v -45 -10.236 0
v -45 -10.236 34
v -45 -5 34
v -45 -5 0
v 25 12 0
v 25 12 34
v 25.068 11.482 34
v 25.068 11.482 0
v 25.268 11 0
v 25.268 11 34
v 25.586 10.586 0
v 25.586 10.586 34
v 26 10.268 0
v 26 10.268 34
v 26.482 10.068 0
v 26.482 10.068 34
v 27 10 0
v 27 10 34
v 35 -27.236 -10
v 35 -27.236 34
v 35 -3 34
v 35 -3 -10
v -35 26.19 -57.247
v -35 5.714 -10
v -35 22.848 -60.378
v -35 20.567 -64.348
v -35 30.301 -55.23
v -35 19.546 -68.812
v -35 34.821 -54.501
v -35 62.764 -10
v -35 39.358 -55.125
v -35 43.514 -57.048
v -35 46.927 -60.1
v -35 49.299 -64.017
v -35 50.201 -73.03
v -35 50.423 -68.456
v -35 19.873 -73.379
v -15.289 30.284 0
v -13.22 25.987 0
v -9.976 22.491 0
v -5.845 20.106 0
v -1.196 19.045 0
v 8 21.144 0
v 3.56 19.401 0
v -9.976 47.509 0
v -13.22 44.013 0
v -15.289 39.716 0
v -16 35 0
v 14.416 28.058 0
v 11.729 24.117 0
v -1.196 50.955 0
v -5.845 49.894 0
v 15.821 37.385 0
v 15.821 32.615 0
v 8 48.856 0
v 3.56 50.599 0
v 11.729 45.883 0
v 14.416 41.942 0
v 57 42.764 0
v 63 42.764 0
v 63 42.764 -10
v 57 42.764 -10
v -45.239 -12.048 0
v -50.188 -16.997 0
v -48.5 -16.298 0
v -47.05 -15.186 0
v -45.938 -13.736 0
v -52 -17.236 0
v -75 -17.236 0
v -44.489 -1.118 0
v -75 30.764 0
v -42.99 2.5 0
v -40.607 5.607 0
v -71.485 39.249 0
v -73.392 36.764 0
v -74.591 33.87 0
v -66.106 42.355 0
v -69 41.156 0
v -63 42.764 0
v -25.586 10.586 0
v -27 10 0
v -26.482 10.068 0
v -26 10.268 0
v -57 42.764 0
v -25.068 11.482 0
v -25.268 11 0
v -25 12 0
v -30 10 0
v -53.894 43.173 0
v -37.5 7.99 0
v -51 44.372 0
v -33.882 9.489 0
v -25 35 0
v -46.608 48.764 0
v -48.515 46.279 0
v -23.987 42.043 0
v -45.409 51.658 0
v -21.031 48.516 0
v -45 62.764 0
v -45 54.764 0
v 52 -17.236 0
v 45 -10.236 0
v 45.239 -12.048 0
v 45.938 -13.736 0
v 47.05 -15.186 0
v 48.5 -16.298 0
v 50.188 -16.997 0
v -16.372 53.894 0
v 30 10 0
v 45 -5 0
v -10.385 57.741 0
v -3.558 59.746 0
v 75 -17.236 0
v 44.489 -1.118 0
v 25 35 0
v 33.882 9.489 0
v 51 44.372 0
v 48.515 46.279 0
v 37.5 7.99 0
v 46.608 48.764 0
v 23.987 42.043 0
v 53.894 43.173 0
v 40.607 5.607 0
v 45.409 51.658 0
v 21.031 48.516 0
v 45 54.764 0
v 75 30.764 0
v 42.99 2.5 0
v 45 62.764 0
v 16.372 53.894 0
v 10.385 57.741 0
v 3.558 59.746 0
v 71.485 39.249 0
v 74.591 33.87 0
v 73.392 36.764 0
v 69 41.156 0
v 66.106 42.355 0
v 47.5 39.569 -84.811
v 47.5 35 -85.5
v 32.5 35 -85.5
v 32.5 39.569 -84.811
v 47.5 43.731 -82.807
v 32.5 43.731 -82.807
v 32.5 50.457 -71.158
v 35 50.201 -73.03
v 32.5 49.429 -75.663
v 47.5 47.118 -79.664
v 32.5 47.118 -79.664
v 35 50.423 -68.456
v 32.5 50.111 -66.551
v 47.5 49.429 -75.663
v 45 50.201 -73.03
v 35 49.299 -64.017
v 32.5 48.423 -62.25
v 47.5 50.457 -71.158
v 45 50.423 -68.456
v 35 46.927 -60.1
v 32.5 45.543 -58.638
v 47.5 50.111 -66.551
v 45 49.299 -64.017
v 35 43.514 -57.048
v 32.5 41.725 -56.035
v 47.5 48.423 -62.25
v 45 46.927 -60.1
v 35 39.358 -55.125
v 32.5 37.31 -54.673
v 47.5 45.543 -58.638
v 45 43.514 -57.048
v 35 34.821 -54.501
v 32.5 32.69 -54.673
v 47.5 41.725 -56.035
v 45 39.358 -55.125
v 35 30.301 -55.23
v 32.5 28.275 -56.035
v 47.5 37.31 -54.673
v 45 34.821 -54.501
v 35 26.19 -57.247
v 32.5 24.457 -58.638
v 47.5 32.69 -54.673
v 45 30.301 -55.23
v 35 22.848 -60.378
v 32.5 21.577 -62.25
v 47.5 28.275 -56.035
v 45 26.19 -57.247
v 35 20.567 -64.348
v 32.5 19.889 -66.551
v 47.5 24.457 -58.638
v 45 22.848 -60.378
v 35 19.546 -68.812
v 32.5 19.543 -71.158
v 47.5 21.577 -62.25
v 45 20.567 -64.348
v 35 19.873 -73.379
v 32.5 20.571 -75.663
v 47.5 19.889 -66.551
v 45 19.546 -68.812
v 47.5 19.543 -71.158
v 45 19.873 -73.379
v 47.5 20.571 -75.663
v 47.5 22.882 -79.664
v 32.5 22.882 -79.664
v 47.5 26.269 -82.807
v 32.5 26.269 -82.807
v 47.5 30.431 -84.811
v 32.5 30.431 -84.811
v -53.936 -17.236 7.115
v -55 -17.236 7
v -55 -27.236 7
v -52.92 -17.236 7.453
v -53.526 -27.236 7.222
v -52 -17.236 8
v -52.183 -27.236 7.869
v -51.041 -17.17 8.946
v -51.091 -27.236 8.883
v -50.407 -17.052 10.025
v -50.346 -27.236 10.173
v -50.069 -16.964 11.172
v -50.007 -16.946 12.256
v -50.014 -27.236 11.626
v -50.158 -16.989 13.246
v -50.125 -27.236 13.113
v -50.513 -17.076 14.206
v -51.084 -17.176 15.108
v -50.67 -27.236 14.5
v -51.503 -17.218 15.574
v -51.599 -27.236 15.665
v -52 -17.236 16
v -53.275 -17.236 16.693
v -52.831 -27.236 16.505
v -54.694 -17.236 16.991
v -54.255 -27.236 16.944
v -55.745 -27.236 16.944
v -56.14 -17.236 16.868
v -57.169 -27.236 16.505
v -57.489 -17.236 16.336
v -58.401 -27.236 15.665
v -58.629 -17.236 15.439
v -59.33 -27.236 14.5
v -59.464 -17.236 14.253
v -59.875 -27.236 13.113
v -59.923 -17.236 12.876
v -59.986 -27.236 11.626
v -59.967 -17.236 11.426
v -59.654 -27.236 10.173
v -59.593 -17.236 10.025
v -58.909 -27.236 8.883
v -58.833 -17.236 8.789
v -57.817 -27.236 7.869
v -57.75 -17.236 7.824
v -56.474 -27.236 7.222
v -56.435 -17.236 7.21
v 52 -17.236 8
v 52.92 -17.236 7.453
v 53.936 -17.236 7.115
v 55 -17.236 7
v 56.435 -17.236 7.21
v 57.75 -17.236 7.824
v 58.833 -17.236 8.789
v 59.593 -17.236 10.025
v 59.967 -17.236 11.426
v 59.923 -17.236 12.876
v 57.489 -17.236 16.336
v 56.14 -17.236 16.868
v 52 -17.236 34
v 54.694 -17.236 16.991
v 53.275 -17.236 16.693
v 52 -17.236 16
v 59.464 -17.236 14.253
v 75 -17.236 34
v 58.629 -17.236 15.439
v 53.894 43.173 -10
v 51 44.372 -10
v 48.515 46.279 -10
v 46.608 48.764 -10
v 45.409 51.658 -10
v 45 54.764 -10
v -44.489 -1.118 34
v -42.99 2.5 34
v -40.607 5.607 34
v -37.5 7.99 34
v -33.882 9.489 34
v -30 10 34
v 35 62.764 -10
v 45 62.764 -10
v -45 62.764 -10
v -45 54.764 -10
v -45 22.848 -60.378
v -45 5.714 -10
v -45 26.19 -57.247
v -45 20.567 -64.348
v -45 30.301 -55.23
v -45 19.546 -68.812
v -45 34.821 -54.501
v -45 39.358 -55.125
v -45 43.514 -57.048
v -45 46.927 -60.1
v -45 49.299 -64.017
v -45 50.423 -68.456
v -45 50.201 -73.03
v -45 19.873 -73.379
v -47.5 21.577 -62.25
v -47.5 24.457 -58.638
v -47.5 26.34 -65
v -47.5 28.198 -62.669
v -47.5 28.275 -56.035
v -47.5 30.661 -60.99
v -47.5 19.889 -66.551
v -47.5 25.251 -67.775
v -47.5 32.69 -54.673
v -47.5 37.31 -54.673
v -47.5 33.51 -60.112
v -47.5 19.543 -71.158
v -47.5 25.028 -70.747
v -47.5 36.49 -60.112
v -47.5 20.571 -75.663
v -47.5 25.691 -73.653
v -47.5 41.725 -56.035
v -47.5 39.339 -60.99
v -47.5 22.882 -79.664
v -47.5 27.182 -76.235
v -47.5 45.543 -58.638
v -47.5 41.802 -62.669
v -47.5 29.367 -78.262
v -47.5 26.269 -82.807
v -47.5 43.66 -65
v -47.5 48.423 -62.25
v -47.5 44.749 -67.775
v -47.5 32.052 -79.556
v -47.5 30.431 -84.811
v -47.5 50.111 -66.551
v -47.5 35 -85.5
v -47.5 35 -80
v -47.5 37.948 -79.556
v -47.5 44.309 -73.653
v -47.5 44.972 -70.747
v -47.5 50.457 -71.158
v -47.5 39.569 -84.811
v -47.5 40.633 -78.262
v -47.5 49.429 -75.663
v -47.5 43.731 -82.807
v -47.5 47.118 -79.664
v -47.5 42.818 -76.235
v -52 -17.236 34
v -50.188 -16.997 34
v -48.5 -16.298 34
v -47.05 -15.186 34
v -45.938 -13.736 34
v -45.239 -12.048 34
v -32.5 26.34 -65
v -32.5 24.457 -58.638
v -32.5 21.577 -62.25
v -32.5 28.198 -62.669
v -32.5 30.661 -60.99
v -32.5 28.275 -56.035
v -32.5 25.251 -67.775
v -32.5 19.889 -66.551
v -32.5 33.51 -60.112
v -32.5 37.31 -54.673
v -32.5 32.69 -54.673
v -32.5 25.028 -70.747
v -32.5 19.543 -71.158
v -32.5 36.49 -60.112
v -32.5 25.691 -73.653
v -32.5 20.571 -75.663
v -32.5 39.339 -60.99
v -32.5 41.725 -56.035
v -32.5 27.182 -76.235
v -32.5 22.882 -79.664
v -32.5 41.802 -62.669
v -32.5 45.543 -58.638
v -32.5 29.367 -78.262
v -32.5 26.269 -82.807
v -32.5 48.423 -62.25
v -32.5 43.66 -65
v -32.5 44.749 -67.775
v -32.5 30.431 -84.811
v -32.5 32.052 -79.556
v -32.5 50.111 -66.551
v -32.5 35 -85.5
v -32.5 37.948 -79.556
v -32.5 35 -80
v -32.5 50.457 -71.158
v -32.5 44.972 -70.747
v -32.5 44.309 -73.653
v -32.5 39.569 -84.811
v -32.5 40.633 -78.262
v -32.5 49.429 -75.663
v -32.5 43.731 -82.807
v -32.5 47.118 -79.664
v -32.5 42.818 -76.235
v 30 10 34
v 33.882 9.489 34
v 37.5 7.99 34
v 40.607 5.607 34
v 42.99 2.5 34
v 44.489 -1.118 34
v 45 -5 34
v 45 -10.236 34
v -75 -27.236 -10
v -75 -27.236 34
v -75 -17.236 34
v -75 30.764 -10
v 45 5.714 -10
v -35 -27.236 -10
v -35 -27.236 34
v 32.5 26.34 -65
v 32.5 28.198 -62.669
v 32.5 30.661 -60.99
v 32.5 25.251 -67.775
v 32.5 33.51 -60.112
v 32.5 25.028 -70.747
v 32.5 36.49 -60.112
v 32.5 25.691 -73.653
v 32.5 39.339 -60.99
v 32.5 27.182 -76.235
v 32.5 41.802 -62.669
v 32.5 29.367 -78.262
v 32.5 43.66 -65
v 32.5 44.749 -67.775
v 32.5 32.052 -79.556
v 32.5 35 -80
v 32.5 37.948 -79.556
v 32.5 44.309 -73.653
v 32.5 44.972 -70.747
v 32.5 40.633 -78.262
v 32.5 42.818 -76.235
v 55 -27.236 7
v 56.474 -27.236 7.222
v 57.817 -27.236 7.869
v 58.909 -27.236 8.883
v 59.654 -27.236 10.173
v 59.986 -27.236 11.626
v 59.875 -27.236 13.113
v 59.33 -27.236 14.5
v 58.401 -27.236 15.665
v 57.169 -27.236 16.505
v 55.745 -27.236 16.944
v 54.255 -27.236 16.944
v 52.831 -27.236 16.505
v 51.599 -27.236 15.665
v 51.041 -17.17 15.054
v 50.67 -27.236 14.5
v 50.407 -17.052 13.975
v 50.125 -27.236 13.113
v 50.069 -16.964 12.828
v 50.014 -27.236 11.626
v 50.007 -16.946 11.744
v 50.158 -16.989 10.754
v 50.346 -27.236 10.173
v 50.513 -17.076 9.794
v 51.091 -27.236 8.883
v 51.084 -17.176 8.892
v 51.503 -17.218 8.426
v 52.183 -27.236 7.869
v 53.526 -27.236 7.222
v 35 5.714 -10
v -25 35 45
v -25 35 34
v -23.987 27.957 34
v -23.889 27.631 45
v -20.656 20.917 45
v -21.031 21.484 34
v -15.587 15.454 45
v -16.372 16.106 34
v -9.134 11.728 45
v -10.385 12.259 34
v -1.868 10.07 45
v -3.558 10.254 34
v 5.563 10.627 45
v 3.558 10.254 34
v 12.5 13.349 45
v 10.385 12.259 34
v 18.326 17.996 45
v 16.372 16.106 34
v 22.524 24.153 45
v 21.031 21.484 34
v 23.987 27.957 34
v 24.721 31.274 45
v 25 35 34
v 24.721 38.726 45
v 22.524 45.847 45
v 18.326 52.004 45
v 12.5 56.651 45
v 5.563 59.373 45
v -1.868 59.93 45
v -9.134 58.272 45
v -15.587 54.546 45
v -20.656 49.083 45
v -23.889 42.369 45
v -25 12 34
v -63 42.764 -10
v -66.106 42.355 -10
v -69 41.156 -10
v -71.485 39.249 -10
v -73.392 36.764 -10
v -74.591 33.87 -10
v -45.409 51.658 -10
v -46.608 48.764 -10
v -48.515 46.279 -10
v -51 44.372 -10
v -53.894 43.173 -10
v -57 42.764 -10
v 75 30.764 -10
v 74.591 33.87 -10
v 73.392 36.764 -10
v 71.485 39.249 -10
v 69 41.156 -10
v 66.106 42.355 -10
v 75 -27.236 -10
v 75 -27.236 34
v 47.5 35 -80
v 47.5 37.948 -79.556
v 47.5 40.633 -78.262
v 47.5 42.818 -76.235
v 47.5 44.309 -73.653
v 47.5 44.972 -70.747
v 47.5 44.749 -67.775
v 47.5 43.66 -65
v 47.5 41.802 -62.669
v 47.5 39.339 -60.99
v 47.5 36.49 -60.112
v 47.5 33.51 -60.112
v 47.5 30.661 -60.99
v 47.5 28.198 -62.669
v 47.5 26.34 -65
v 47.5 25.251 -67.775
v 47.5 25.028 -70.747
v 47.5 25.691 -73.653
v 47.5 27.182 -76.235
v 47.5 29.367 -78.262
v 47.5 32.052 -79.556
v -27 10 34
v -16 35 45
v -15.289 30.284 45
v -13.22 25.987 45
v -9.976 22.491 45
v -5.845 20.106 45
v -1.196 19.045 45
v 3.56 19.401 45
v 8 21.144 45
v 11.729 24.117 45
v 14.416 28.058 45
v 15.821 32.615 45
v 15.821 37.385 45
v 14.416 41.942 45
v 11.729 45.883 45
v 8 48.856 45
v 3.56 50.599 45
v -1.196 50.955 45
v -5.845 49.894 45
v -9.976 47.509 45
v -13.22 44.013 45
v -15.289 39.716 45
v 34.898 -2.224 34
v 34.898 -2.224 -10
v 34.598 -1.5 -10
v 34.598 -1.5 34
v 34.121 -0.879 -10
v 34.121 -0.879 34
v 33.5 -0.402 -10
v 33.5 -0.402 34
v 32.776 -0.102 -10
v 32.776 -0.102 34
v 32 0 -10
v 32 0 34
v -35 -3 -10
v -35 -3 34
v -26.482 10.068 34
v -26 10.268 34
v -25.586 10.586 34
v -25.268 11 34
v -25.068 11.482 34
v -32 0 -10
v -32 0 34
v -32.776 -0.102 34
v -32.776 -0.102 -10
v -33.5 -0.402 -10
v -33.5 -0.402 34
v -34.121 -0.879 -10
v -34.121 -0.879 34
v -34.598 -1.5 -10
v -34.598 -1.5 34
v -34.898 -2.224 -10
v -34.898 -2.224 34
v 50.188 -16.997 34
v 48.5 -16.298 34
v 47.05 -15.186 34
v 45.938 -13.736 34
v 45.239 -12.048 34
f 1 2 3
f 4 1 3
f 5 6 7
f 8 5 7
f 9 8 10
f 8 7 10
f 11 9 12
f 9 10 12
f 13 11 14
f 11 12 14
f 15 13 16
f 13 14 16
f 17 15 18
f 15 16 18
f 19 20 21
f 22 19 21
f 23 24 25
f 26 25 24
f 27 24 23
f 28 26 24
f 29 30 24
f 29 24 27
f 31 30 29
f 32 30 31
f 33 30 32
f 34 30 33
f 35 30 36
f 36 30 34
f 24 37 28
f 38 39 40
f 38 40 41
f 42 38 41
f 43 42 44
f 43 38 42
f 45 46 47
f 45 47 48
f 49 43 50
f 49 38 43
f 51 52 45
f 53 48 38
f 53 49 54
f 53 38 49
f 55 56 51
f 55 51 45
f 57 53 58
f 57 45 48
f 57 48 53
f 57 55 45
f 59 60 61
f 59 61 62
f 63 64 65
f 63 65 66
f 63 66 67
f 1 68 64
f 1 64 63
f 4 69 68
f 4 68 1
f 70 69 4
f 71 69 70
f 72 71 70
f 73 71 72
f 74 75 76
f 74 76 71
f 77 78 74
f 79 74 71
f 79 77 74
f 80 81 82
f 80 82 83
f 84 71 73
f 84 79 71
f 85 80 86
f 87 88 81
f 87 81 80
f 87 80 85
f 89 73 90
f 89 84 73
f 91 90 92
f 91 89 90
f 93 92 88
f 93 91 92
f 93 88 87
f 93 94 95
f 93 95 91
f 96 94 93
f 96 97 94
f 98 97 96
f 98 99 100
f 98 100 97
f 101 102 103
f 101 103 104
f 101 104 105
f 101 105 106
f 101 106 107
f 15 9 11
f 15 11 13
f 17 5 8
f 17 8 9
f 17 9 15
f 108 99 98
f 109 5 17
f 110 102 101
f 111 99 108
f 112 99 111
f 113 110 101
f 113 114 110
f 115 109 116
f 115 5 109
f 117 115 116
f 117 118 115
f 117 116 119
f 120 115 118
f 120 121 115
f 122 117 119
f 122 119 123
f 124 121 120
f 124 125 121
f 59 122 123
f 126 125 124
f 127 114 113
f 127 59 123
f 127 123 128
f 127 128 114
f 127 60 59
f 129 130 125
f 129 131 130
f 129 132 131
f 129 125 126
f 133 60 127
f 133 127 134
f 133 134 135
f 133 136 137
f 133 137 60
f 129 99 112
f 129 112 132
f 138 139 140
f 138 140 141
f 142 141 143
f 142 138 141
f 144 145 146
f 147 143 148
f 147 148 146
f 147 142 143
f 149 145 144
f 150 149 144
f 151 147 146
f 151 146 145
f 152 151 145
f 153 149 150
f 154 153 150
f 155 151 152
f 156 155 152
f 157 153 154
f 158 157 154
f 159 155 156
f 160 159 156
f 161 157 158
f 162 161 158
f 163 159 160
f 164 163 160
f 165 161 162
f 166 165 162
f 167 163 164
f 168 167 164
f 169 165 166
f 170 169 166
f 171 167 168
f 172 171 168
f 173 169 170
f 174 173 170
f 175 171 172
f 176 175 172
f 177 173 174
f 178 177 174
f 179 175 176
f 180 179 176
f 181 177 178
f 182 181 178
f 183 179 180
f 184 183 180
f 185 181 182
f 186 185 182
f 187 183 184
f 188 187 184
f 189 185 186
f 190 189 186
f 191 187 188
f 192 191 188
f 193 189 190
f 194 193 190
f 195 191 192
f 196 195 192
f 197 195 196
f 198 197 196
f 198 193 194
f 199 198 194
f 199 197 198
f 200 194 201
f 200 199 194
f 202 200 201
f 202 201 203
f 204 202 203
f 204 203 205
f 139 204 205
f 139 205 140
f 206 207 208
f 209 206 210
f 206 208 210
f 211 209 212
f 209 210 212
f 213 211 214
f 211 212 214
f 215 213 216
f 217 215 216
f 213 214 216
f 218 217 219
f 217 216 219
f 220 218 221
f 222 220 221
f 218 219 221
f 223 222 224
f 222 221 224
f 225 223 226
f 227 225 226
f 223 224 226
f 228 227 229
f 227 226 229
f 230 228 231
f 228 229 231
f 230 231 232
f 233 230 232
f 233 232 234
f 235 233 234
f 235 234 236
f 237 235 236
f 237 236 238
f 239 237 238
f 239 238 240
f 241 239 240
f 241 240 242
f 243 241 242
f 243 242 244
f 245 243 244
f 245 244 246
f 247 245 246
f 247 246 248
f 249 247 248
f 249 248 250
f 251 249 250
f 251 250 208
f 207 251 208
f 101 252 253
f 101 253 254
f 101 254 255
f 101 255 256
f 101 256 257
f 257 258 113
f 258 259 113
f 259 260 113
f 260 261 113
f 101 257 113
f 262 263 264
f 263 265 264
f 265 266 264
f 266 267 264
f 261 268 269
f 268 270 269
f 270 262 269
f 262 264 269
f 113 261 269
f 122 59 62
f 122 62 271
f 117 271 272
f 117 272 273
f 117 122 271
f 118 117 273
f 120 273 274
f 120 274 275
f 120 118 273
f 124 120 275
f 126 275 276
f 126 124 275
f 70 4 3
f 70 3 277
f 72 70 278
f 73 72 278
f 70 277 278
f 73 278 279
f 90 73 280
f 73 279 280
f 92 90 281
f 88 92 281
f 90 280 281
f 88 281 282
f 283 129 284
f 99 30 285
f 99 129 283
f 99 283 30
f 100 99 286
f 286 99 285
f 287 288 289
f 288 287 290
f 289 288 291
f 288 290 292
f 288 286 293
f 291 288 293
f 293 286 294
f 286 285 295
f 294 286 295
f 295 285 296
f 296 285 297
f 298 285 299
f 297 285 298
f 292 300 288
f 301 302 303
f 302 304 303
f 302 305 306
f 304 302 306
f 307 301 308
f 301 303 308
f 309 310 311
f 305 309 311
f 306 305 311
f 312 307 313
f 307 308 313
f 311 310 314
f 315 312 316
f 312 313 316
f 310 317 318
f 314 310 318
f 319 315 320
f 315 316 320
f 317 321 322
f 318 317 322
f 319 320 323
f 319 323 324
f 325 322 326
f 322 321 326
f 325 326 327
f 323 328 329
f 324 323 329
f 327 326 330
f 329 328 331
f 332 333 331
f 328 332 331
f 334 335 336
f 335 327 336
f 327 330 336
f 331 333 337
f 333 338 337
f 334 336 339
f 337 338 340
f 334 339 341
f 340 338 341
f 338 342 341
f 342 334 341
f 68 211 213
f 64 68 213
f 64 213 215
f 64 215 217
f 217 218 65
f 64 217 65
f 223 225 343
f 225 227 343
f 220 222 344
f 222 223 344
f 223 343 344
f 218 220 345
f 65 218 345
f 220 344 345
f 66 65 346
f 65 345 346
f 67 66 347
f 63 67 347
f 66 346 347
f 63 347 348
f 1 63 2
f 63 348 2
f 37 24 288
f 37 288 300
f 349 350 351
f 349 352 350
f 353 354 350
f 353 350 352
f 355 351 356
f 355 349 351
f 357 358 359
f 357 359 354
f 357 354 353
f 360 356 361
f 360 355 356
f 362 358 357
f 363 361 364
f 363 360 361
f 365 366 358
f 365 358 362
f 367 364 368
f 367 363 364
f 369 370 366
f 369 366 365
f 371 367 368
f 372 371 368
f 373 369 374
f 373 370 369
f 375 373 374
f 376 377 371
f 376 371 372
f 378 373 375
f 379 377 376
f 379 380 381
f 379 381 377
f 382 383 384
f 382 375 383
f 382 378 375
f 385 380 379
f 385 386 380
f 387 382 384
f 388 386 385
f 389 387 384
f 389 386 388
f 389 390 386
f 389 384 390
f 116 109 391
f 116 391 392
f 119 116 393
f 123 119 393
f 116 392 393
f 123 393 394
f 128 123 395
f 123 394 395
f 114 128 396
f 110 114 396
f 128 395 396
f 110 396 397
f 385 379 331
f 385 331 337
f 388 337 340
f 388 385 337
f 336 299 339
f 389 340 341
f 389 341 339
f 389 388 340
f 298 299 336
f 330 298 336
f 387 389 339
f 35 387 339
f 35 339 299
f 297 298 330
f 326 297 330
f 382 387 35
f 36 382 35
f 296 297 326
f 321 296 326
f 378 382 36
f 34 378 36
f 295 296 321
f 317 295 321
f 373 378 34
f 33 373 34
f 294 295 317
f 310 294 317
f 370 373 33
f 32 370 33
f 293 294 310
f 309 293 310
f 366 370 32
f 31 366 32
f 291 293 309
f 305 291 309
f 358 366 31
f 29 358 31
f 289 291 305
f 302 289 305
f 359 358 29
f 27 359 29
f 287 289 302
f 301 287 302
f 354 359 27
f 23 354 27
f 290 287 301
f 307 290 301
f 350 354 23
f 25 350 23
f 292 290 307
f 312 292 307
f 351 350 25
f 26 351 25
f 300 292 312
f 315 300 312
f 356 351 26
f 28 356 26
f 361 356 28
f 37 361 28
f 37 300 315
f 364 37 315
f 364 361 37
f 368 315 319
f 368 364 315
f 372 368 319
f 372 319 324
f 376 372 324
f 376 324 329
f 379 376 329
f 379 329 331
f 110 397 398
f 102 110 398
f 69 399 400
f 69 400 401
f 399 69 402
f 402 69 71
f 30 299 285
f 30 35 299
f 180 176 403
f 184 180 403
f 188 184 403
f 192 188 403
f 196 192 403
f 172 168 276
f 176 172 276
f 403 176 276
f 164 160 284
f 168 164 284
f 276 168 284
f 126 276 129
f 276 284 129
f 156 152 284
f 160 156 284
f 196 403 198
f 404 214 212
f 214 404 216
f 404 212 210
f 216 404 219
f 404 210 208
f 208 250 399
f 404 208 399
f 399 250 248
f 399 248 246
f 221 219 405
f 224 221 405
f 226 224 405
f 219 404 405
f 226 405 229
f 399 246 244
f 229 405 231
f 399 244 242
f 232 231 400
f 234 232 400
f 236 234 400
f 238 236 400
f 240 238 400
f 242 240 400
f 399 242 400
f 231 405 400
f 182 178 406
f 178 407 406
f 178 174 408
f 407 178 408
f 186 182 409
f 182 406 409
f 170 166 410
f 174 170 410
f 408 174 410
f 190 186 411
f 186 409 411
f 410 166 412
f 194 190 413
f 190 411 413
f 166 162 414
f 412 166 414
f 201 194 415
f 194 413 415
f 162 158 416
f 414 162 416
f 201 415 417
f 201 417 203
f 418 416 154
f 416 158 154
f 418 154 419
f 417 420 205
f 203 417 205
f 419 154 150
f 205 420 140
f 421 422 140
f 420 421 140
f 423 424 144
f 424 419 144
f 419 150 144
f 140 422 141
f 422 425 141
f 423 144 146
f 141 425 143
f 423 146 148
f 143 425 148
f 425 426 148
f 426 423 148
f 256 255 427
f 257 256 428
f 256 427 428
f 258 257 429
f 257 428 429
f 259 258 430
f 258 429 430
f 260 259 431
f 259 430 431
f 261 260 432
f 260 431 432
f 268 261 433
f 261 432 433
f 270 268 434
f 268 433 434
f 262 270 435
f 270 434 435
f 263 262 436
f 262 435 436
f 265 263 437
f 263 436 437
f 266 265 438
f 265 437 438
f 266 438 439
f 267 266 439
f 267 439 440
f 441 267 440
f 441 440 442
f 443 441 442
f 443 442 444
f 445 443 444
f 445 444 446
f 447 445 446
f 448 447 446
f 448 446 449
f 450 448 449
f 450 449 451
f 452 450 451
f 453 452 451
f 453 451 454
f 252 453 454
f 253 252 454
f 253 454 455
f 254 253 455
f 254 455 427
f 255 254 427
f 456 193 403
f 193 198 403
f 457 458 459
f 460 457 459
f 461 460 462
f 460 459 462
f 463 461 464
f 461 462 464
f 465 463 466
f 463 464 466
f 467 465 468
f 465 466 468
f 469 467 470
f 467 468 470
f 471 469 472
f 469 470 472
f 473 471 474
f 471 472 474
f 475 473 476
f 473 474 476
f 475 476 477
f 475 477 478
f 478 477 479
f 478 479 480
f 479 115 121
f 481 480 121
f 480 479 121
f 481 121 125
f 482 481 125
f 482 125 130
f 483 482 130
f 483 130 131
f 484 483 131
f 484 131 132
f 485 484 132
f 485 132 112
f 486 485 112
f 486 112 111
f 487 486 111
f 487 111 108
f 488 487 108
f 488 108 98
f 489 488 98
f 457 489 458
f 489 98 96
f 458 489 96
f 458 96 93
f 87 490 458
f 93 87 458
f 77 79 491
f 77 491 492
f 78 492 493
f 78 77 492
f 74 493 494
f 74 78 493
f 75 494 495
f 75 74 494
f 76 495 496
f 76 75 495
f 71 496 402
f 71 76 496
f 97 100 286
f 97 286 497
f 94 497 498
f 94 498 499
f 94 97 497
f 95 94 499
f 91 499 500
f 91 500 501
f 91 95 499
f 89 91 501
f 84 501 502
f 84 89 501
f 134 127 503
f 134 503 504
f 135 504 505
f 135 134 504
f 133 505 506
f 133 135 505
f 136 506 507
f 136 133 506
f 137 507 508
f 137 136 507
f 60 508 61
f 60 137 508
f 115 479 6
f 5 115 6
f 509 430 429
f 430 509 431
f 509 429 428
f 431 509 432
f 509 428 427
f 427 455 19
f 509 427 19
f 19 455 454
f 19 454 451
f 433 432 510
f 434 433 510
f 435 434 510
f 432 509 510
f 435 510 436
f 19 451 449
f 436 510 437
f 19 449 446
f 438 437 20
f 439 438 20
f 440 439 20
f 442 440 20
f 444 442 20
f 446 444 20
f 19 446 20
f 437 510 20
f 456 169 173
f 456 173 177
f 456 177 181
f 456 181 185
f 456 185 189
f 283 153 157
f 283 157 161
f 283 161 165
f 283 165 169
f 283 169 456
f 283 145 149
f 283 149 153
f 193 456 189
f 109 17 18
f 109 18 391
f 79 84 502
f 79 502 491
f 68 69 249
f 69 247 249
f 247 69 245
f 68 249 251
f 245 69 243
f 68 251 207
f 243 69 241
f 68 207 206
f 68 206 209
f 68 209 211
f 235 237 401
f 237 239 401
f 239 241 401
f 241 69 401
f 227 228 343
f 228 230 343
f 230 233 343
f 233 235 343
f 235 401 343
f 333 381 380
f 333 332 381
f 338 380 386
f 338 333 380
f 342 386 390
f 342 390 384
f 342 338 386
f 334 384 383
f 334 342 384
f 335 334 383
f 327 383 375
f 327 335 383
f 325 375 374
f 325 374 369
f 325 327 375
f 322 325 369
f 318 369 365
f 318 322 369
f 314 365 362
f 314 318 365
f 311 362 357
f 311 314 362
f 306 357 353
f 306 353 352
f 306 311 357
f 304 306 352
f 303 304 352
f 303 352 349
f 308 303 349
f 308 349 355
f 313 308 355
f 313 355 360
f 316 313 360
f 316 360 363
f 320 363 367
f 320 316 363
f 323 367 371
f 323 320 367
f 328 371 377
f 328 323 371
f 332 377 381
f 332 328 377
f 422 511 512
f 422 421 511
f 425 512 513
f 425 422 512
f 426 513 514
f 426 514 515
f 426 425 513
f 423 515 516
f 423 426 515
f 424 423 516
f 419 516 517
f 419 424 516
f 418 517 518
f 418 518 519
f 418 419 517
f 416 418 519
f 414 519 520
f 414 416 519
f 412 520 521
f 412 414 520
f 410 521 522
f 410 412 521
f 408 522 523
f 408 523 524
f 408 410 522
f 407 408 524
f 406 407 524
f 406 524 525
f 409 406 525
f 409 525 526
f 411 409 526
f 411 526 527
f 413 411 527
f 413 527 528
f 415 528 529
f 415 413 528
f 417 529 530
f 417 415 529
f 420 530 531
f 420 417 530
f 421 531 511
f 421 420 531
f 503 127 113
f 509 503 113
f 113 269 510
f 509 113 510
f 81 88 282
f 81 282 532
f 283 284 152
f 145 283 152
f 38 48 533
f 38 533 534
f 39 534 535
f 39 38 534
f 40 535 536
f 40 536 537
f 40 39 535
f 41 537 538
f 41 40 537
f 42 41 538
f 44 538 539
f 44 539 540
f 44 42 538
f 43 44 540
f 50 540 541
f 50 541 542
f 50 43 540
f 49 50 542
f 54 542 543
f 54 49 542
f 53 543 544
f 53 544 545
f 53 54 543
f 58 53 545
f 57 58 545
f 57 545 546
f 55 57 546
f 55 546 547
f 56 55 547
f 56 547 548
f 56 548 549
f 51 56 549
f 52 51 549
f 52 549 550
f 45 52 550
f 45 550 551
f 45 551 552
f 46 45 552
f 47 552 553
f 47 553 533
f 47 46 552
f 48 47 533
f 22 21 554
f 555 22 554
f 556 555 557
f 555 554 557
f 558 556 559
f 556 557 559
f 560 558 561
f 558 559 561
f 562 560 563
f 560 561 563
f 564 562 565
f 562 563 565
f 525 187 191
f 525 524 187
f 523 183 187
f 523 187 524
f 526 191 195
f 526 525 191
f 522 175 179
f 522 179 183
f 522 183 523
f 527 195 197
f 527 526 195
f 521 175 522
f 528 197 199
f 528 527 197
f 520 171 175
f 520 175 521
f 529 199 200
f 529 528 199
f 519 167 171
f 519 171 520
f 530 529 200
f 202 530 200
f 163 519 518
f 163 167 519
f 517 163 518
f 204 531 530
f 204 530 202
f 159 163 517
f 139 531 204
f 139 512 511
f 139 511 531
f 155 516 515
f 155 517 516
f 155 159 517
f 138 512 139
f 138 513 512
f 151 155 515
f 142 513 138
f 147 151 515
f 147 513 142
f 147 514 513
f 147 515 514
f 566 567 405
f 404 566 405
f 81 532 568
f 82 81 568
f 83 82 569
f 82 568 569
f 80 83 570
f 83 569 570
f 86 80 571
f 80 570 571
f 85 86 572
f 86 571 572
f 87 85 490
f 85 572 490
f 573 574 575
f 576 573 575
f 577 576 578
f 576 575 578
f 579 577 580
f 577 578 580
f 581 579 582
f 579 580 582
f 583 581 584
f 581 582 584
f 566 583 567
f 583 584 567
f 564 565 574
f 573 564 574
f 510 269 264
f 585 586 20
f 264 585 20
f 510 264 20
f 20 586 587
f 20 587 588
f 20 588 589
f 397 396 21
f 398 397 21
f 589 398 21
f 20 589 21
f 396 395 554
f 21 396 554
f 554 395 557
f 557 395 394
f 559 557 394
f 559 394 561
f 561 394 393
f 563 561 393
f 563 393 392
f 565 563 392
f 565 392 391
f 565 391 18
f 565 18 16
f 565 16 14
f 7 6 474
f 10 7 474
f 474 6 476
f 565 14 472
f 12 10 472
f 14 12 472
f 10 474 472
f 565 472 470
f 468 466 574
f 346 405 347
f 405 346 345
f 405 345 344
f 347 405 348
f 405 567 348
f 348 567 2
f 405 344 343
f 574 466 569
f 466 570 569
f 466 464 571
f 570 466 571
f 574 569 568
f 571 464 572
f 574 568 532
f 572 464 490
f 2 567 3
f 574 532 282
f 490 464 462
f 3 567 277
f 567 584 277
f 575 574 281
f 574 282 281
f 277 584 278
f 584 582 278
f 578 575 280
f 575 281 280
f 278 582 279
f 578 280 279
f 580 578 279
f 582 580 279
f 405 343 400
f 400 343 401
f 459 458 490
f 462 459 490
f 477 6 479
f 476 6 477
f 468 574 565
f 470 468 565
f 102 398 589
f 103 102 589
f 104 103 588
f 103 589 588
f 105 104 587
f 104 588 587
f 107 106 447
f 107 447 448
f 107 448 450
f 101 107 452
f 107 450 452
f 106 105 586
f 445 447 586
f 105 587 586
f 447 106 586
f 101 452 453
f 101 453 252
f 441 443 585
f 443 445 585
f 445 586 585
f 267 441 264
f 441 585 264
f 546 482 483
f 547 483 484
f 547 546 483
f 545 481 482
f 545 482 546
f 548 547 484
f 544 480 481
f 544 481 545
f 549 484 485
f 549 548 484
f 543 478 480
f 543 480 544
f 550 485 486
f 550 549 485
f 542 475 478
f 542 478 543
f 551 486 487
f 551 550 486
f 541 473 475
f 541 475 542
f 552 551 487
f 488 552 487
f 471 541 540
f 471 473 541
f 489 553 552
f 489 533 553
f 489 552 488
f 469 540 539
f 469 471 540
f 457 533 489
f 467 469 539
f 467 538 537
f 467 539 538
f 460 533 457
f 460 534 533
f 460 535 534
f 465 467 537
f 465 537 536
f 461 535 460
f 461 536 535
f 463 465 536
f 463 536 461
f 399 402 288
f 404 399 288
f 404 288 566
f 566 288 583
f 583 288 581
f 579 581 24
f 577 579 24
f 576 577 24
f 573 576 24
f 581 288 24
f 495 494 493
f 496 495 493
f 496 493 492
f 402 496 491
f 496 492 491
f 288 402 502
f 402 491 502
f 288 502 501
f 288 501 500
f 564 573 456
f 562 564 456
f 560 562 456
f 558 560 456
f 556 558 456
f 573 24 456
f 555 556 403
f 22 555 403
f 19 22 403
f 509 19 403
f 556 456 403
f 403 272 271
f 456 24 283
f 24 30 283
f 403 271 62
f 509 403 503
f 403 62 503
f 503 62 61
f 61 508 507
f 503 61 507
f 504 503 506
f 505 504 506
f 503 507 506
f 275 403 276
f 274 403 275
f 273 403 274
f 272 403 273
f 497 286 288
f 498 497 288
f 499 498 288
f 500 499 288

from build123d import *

# Parameters (mm, degrees)
BOSS_EXTRUDE2_DEPTH  = 10
SKETCH2_R            = 25
SKETCH2_R_2          = 16
BOSS_EXTRUDE4_DEPTH  = 45
BOSS_EXTRUDE5_START  = 34
BOSS_EXTRUDE5_DEPTH  = 34
SKETCH4_R            = 5
CUT_EXTRUDE1_DEPTH   = 34
SKETCH6_R            = 15.5
SKETCH6_R_2          = 10
BOSS_EXTRUDE6_DEPTH  = 7.5
BOSS_EXTRUDE8_DEPTH  = 5
SKETCH8_R            = 15.5
SKETCH8_R_2          = 10
BOSS_EXTRUDE9_DEPTH  = 7.5
BOSS_EXTRUDE10_DEPTH = 5


with BuildPart() as part:
    # Sketch1 → Boss-Extrude2 (new body)
    with BuildSketch(Plane.XY):
        with BuildLine():
            Line((-32, 0), (32, 0))
            ThreePointArc((32, 0), (34.121320344, -0.878679656), (35, -3))
            Line((35, -3), (35, -27.235915493))
            Line((35, -27.235915493), (75, -27.235915493))
            Line((75, -27.235915493), (75, 30.764084507))
            ThreePointArc((75, 30.764084507), (71.485281374, 39.249365881), (63, 42.764084507))
            Line((63, 42.764084507), (57, 42.764084507))
            ThreePointArc((57, 42.764084507), (48.514718626, 46.278803133), (45, 54.764084507))
            Line((45, 54.764084507), (45, 62.764084507))
            Line((45, 62.764084507), (-45, 62.764084507))
            Line((-45, 62.764084507), (-45, 54.764084507))
            ThreePointArc((-45, 54.764084507), (-48.514718626, 46.278803133), (-57, 42.764084507))
            Line((-57, 42.764084507), (-63, 42.764084507))
            ThreePointArc((-63, 42.764084507), (-71.485281374, 39.249365881), (-75, 30.764084507))
            Line((-75, 30.764084507), (-75, -27.235915493))
            Line((-75, -27.235915493), (-35, -27.235915493))
            Line((-35, -27.235915493), (-35, -3))
            ThreePointArc((-35, -3), (-34.121320344, -0.878679656), (-32, 0))
        make_face()
    extrude(amount=-BOSS_EXTRUDE2_DEPTH)

    # Sketch2 → Boss-Extrude4 (add)
    with BuildSketch(Plane.XY):
        with Locations(Location((0, 35, 0), (0, 0, 180))):
            Circle(SKETCH2_R)
        with Locations(Location((0, 35, 0), (0, 0, 180))):
            Circle(SKETCH2_R_2, mode=Mode.SUBTRACT)
    extrude(amount=BOSS_EXTRUDE4_DEPTH)

    # Sketch3 → Boss-Extrude5 (add)
    with BuildSketch(Plane.XY.offset(BOSS_EXTRUDE5_START)):
        with BuildLine():
            Line((-75, -17.235915493), (-52, -17.235915493))
            ThreePointArc((-52, -17.235915493), (-47.050252532, -15.185662961), (-45, -10.235915493))
            Line((-45, -10.235915493), (-45, -5))
            ThreePointArc((-45, -5), (-40.606601718, 5.606601718), (-30, 10))
            Line((-30, 10), (-27, 10))
            ThreePointArc((-27, 10), (-25.585786438, 10.585786438), (-25, 12))
            Line((-25, 12), (-25, 35))
            ThreePointArc((-25, 35), (0, 10), (25, 35))
            Line((25, 35), (25, 12))
            ThreePointArc((25, 12), (25.585786438, 10.585786438), (27, 10))
            Line((27, 10), (30, 10))
            ThreePointArc((30, 10), (40.606601718, 5.606601718), (45, -5))
            Line((45, -5), (45, -10.235915493))
            ThreePointArc((45, -10.235915493), (47.050252532, -15.185662961), (52, -17.235915493))
            Line((52, -17.235915493), (75, -17.235915493))
            Line((75, -17.235915493), (75, -27.235915493))
            Line((75, -27.235915493), (35, -27.235915493))
            Line((35, -27.235915493), (35, -3))
            ThreePointArc((35, -3), (34.121320344, -0.878679656), (32, 0))
            Line((32, 0), (-32, 0))
            ThreePointArc((-32, 0), (-34.121320344, -0.878679656), (-35, -3))
            Line((-35, -3), (-35, -27.235915493))
            Line((-35, -27.235915493), (-75, -27.235915493))
            Line((-75, -27.235915493), (-75, -17.235915493))
        make_face()
    extrude(amount=-BOSS_EXTRUDE5_DEPTH)

    # Sketch4 → Cut-Extrude1 (cut)
    with BuildSketch(Plane.XZ.offset(27.235915493)):
        with Locations(Location((-55, 12, 0), (0, 0, 270))):
            Circle(SKETCH4_R)
        with Locations(Location((55, 12, 0), (0, 0, 270))):
            Circle(SKETCH4_R)
    extrude(amount=-CUT_EXTRUDE1_DEPTH, mode=Mode.SUBTRACT)



with BuildPart() as body_2:
    # Sketch6 → Boss-Extrude6 (new, symmetric)
    with BuildSketch(Plane(origin=(40, 0, 0), x_dir=(0, 0, -1), z_dir=(1, 0, 0))):
        with Locations((70, 35)):
            Circle(SKETCH6_R)
        with Locations((70, 35)):
            Circle(SKETCH6_R_2, mode=Mode.SUBTRACT)
    extrude(amount=BOSS_EXTRUDE6_DEPTH, both=True)


with BuildPart() as part_1:
    add(part.part)

    add(body_2.part)  # Boss-Extrude8 merges body 2
    # Sketch7 → Boss-Extrude8 (add, symmetric)
    with BuildSketch(Plane(origin=(40, 0, 0), x_dir=(0, 0, -1), z_dir=(1, 0, 0))):
        with BuildLine():
            Line((10, 62.764084507), (73.029857486, 50.200985613))
            ThreePointArc((73.029857486, 50.200985613), (54.50102976, 34.821334149), (73.379467389, 19.872898488))
            Line((73.379467389, 19.872898488), (10, 5.71361999))
            Line((10, 5.71361999), (10, 62.764084507))
        make_face()
    extrude(amount=BOSS_EXTRUDE8_DEPTH, both=True)



with BuildPart() as body_2_2:
    # Sketch8 → Boss-Extrude9 (new, symmetric)
    with BuildSketch(Plane(origin=(-40, 0, 0), x_dir=(0, 0, -1), z_dir=(1, 0, 0))):
        with Locations((70, 35)):
            Circle(SKETCH8_R)
        with Locations((70, 35)):
            Circle(SKETCH8_R_2, mode=Mode.SUBTRACT)
    extrude(amount=BOSS_EXTRUDE9_DEPTH, both=True)


with BuildPart() as part_2:
    add(part_1.part)

    add(body_2_2.part)  # Boss-Extrude10 merges body 2 2
    # Sketch9 → Boss-Extrude10 (add, symmetric)
    with BuildSketch(Plane(origin=(-40, 0, 0), x_dir=(0, 0, -1), z_dir=(1, 0, 0))):
        with BuildLine():
            Line((73.029857486, 50.200985613), (10, 62.764084507))
            Line((10, 62.764084507), (10, 5.71361999))
            Line((10, 5.71361999), (73.379467389, 19.872898488))
            ThreePointArc((73.379467389, 19.872898488), (54.50102976, 34.821334149), (73.029857486, 50.200985613))
        make_face()
    extrude(amount=BOSS_EXTRUDE10_DEPTH, both=True)


solid = part_2.part
